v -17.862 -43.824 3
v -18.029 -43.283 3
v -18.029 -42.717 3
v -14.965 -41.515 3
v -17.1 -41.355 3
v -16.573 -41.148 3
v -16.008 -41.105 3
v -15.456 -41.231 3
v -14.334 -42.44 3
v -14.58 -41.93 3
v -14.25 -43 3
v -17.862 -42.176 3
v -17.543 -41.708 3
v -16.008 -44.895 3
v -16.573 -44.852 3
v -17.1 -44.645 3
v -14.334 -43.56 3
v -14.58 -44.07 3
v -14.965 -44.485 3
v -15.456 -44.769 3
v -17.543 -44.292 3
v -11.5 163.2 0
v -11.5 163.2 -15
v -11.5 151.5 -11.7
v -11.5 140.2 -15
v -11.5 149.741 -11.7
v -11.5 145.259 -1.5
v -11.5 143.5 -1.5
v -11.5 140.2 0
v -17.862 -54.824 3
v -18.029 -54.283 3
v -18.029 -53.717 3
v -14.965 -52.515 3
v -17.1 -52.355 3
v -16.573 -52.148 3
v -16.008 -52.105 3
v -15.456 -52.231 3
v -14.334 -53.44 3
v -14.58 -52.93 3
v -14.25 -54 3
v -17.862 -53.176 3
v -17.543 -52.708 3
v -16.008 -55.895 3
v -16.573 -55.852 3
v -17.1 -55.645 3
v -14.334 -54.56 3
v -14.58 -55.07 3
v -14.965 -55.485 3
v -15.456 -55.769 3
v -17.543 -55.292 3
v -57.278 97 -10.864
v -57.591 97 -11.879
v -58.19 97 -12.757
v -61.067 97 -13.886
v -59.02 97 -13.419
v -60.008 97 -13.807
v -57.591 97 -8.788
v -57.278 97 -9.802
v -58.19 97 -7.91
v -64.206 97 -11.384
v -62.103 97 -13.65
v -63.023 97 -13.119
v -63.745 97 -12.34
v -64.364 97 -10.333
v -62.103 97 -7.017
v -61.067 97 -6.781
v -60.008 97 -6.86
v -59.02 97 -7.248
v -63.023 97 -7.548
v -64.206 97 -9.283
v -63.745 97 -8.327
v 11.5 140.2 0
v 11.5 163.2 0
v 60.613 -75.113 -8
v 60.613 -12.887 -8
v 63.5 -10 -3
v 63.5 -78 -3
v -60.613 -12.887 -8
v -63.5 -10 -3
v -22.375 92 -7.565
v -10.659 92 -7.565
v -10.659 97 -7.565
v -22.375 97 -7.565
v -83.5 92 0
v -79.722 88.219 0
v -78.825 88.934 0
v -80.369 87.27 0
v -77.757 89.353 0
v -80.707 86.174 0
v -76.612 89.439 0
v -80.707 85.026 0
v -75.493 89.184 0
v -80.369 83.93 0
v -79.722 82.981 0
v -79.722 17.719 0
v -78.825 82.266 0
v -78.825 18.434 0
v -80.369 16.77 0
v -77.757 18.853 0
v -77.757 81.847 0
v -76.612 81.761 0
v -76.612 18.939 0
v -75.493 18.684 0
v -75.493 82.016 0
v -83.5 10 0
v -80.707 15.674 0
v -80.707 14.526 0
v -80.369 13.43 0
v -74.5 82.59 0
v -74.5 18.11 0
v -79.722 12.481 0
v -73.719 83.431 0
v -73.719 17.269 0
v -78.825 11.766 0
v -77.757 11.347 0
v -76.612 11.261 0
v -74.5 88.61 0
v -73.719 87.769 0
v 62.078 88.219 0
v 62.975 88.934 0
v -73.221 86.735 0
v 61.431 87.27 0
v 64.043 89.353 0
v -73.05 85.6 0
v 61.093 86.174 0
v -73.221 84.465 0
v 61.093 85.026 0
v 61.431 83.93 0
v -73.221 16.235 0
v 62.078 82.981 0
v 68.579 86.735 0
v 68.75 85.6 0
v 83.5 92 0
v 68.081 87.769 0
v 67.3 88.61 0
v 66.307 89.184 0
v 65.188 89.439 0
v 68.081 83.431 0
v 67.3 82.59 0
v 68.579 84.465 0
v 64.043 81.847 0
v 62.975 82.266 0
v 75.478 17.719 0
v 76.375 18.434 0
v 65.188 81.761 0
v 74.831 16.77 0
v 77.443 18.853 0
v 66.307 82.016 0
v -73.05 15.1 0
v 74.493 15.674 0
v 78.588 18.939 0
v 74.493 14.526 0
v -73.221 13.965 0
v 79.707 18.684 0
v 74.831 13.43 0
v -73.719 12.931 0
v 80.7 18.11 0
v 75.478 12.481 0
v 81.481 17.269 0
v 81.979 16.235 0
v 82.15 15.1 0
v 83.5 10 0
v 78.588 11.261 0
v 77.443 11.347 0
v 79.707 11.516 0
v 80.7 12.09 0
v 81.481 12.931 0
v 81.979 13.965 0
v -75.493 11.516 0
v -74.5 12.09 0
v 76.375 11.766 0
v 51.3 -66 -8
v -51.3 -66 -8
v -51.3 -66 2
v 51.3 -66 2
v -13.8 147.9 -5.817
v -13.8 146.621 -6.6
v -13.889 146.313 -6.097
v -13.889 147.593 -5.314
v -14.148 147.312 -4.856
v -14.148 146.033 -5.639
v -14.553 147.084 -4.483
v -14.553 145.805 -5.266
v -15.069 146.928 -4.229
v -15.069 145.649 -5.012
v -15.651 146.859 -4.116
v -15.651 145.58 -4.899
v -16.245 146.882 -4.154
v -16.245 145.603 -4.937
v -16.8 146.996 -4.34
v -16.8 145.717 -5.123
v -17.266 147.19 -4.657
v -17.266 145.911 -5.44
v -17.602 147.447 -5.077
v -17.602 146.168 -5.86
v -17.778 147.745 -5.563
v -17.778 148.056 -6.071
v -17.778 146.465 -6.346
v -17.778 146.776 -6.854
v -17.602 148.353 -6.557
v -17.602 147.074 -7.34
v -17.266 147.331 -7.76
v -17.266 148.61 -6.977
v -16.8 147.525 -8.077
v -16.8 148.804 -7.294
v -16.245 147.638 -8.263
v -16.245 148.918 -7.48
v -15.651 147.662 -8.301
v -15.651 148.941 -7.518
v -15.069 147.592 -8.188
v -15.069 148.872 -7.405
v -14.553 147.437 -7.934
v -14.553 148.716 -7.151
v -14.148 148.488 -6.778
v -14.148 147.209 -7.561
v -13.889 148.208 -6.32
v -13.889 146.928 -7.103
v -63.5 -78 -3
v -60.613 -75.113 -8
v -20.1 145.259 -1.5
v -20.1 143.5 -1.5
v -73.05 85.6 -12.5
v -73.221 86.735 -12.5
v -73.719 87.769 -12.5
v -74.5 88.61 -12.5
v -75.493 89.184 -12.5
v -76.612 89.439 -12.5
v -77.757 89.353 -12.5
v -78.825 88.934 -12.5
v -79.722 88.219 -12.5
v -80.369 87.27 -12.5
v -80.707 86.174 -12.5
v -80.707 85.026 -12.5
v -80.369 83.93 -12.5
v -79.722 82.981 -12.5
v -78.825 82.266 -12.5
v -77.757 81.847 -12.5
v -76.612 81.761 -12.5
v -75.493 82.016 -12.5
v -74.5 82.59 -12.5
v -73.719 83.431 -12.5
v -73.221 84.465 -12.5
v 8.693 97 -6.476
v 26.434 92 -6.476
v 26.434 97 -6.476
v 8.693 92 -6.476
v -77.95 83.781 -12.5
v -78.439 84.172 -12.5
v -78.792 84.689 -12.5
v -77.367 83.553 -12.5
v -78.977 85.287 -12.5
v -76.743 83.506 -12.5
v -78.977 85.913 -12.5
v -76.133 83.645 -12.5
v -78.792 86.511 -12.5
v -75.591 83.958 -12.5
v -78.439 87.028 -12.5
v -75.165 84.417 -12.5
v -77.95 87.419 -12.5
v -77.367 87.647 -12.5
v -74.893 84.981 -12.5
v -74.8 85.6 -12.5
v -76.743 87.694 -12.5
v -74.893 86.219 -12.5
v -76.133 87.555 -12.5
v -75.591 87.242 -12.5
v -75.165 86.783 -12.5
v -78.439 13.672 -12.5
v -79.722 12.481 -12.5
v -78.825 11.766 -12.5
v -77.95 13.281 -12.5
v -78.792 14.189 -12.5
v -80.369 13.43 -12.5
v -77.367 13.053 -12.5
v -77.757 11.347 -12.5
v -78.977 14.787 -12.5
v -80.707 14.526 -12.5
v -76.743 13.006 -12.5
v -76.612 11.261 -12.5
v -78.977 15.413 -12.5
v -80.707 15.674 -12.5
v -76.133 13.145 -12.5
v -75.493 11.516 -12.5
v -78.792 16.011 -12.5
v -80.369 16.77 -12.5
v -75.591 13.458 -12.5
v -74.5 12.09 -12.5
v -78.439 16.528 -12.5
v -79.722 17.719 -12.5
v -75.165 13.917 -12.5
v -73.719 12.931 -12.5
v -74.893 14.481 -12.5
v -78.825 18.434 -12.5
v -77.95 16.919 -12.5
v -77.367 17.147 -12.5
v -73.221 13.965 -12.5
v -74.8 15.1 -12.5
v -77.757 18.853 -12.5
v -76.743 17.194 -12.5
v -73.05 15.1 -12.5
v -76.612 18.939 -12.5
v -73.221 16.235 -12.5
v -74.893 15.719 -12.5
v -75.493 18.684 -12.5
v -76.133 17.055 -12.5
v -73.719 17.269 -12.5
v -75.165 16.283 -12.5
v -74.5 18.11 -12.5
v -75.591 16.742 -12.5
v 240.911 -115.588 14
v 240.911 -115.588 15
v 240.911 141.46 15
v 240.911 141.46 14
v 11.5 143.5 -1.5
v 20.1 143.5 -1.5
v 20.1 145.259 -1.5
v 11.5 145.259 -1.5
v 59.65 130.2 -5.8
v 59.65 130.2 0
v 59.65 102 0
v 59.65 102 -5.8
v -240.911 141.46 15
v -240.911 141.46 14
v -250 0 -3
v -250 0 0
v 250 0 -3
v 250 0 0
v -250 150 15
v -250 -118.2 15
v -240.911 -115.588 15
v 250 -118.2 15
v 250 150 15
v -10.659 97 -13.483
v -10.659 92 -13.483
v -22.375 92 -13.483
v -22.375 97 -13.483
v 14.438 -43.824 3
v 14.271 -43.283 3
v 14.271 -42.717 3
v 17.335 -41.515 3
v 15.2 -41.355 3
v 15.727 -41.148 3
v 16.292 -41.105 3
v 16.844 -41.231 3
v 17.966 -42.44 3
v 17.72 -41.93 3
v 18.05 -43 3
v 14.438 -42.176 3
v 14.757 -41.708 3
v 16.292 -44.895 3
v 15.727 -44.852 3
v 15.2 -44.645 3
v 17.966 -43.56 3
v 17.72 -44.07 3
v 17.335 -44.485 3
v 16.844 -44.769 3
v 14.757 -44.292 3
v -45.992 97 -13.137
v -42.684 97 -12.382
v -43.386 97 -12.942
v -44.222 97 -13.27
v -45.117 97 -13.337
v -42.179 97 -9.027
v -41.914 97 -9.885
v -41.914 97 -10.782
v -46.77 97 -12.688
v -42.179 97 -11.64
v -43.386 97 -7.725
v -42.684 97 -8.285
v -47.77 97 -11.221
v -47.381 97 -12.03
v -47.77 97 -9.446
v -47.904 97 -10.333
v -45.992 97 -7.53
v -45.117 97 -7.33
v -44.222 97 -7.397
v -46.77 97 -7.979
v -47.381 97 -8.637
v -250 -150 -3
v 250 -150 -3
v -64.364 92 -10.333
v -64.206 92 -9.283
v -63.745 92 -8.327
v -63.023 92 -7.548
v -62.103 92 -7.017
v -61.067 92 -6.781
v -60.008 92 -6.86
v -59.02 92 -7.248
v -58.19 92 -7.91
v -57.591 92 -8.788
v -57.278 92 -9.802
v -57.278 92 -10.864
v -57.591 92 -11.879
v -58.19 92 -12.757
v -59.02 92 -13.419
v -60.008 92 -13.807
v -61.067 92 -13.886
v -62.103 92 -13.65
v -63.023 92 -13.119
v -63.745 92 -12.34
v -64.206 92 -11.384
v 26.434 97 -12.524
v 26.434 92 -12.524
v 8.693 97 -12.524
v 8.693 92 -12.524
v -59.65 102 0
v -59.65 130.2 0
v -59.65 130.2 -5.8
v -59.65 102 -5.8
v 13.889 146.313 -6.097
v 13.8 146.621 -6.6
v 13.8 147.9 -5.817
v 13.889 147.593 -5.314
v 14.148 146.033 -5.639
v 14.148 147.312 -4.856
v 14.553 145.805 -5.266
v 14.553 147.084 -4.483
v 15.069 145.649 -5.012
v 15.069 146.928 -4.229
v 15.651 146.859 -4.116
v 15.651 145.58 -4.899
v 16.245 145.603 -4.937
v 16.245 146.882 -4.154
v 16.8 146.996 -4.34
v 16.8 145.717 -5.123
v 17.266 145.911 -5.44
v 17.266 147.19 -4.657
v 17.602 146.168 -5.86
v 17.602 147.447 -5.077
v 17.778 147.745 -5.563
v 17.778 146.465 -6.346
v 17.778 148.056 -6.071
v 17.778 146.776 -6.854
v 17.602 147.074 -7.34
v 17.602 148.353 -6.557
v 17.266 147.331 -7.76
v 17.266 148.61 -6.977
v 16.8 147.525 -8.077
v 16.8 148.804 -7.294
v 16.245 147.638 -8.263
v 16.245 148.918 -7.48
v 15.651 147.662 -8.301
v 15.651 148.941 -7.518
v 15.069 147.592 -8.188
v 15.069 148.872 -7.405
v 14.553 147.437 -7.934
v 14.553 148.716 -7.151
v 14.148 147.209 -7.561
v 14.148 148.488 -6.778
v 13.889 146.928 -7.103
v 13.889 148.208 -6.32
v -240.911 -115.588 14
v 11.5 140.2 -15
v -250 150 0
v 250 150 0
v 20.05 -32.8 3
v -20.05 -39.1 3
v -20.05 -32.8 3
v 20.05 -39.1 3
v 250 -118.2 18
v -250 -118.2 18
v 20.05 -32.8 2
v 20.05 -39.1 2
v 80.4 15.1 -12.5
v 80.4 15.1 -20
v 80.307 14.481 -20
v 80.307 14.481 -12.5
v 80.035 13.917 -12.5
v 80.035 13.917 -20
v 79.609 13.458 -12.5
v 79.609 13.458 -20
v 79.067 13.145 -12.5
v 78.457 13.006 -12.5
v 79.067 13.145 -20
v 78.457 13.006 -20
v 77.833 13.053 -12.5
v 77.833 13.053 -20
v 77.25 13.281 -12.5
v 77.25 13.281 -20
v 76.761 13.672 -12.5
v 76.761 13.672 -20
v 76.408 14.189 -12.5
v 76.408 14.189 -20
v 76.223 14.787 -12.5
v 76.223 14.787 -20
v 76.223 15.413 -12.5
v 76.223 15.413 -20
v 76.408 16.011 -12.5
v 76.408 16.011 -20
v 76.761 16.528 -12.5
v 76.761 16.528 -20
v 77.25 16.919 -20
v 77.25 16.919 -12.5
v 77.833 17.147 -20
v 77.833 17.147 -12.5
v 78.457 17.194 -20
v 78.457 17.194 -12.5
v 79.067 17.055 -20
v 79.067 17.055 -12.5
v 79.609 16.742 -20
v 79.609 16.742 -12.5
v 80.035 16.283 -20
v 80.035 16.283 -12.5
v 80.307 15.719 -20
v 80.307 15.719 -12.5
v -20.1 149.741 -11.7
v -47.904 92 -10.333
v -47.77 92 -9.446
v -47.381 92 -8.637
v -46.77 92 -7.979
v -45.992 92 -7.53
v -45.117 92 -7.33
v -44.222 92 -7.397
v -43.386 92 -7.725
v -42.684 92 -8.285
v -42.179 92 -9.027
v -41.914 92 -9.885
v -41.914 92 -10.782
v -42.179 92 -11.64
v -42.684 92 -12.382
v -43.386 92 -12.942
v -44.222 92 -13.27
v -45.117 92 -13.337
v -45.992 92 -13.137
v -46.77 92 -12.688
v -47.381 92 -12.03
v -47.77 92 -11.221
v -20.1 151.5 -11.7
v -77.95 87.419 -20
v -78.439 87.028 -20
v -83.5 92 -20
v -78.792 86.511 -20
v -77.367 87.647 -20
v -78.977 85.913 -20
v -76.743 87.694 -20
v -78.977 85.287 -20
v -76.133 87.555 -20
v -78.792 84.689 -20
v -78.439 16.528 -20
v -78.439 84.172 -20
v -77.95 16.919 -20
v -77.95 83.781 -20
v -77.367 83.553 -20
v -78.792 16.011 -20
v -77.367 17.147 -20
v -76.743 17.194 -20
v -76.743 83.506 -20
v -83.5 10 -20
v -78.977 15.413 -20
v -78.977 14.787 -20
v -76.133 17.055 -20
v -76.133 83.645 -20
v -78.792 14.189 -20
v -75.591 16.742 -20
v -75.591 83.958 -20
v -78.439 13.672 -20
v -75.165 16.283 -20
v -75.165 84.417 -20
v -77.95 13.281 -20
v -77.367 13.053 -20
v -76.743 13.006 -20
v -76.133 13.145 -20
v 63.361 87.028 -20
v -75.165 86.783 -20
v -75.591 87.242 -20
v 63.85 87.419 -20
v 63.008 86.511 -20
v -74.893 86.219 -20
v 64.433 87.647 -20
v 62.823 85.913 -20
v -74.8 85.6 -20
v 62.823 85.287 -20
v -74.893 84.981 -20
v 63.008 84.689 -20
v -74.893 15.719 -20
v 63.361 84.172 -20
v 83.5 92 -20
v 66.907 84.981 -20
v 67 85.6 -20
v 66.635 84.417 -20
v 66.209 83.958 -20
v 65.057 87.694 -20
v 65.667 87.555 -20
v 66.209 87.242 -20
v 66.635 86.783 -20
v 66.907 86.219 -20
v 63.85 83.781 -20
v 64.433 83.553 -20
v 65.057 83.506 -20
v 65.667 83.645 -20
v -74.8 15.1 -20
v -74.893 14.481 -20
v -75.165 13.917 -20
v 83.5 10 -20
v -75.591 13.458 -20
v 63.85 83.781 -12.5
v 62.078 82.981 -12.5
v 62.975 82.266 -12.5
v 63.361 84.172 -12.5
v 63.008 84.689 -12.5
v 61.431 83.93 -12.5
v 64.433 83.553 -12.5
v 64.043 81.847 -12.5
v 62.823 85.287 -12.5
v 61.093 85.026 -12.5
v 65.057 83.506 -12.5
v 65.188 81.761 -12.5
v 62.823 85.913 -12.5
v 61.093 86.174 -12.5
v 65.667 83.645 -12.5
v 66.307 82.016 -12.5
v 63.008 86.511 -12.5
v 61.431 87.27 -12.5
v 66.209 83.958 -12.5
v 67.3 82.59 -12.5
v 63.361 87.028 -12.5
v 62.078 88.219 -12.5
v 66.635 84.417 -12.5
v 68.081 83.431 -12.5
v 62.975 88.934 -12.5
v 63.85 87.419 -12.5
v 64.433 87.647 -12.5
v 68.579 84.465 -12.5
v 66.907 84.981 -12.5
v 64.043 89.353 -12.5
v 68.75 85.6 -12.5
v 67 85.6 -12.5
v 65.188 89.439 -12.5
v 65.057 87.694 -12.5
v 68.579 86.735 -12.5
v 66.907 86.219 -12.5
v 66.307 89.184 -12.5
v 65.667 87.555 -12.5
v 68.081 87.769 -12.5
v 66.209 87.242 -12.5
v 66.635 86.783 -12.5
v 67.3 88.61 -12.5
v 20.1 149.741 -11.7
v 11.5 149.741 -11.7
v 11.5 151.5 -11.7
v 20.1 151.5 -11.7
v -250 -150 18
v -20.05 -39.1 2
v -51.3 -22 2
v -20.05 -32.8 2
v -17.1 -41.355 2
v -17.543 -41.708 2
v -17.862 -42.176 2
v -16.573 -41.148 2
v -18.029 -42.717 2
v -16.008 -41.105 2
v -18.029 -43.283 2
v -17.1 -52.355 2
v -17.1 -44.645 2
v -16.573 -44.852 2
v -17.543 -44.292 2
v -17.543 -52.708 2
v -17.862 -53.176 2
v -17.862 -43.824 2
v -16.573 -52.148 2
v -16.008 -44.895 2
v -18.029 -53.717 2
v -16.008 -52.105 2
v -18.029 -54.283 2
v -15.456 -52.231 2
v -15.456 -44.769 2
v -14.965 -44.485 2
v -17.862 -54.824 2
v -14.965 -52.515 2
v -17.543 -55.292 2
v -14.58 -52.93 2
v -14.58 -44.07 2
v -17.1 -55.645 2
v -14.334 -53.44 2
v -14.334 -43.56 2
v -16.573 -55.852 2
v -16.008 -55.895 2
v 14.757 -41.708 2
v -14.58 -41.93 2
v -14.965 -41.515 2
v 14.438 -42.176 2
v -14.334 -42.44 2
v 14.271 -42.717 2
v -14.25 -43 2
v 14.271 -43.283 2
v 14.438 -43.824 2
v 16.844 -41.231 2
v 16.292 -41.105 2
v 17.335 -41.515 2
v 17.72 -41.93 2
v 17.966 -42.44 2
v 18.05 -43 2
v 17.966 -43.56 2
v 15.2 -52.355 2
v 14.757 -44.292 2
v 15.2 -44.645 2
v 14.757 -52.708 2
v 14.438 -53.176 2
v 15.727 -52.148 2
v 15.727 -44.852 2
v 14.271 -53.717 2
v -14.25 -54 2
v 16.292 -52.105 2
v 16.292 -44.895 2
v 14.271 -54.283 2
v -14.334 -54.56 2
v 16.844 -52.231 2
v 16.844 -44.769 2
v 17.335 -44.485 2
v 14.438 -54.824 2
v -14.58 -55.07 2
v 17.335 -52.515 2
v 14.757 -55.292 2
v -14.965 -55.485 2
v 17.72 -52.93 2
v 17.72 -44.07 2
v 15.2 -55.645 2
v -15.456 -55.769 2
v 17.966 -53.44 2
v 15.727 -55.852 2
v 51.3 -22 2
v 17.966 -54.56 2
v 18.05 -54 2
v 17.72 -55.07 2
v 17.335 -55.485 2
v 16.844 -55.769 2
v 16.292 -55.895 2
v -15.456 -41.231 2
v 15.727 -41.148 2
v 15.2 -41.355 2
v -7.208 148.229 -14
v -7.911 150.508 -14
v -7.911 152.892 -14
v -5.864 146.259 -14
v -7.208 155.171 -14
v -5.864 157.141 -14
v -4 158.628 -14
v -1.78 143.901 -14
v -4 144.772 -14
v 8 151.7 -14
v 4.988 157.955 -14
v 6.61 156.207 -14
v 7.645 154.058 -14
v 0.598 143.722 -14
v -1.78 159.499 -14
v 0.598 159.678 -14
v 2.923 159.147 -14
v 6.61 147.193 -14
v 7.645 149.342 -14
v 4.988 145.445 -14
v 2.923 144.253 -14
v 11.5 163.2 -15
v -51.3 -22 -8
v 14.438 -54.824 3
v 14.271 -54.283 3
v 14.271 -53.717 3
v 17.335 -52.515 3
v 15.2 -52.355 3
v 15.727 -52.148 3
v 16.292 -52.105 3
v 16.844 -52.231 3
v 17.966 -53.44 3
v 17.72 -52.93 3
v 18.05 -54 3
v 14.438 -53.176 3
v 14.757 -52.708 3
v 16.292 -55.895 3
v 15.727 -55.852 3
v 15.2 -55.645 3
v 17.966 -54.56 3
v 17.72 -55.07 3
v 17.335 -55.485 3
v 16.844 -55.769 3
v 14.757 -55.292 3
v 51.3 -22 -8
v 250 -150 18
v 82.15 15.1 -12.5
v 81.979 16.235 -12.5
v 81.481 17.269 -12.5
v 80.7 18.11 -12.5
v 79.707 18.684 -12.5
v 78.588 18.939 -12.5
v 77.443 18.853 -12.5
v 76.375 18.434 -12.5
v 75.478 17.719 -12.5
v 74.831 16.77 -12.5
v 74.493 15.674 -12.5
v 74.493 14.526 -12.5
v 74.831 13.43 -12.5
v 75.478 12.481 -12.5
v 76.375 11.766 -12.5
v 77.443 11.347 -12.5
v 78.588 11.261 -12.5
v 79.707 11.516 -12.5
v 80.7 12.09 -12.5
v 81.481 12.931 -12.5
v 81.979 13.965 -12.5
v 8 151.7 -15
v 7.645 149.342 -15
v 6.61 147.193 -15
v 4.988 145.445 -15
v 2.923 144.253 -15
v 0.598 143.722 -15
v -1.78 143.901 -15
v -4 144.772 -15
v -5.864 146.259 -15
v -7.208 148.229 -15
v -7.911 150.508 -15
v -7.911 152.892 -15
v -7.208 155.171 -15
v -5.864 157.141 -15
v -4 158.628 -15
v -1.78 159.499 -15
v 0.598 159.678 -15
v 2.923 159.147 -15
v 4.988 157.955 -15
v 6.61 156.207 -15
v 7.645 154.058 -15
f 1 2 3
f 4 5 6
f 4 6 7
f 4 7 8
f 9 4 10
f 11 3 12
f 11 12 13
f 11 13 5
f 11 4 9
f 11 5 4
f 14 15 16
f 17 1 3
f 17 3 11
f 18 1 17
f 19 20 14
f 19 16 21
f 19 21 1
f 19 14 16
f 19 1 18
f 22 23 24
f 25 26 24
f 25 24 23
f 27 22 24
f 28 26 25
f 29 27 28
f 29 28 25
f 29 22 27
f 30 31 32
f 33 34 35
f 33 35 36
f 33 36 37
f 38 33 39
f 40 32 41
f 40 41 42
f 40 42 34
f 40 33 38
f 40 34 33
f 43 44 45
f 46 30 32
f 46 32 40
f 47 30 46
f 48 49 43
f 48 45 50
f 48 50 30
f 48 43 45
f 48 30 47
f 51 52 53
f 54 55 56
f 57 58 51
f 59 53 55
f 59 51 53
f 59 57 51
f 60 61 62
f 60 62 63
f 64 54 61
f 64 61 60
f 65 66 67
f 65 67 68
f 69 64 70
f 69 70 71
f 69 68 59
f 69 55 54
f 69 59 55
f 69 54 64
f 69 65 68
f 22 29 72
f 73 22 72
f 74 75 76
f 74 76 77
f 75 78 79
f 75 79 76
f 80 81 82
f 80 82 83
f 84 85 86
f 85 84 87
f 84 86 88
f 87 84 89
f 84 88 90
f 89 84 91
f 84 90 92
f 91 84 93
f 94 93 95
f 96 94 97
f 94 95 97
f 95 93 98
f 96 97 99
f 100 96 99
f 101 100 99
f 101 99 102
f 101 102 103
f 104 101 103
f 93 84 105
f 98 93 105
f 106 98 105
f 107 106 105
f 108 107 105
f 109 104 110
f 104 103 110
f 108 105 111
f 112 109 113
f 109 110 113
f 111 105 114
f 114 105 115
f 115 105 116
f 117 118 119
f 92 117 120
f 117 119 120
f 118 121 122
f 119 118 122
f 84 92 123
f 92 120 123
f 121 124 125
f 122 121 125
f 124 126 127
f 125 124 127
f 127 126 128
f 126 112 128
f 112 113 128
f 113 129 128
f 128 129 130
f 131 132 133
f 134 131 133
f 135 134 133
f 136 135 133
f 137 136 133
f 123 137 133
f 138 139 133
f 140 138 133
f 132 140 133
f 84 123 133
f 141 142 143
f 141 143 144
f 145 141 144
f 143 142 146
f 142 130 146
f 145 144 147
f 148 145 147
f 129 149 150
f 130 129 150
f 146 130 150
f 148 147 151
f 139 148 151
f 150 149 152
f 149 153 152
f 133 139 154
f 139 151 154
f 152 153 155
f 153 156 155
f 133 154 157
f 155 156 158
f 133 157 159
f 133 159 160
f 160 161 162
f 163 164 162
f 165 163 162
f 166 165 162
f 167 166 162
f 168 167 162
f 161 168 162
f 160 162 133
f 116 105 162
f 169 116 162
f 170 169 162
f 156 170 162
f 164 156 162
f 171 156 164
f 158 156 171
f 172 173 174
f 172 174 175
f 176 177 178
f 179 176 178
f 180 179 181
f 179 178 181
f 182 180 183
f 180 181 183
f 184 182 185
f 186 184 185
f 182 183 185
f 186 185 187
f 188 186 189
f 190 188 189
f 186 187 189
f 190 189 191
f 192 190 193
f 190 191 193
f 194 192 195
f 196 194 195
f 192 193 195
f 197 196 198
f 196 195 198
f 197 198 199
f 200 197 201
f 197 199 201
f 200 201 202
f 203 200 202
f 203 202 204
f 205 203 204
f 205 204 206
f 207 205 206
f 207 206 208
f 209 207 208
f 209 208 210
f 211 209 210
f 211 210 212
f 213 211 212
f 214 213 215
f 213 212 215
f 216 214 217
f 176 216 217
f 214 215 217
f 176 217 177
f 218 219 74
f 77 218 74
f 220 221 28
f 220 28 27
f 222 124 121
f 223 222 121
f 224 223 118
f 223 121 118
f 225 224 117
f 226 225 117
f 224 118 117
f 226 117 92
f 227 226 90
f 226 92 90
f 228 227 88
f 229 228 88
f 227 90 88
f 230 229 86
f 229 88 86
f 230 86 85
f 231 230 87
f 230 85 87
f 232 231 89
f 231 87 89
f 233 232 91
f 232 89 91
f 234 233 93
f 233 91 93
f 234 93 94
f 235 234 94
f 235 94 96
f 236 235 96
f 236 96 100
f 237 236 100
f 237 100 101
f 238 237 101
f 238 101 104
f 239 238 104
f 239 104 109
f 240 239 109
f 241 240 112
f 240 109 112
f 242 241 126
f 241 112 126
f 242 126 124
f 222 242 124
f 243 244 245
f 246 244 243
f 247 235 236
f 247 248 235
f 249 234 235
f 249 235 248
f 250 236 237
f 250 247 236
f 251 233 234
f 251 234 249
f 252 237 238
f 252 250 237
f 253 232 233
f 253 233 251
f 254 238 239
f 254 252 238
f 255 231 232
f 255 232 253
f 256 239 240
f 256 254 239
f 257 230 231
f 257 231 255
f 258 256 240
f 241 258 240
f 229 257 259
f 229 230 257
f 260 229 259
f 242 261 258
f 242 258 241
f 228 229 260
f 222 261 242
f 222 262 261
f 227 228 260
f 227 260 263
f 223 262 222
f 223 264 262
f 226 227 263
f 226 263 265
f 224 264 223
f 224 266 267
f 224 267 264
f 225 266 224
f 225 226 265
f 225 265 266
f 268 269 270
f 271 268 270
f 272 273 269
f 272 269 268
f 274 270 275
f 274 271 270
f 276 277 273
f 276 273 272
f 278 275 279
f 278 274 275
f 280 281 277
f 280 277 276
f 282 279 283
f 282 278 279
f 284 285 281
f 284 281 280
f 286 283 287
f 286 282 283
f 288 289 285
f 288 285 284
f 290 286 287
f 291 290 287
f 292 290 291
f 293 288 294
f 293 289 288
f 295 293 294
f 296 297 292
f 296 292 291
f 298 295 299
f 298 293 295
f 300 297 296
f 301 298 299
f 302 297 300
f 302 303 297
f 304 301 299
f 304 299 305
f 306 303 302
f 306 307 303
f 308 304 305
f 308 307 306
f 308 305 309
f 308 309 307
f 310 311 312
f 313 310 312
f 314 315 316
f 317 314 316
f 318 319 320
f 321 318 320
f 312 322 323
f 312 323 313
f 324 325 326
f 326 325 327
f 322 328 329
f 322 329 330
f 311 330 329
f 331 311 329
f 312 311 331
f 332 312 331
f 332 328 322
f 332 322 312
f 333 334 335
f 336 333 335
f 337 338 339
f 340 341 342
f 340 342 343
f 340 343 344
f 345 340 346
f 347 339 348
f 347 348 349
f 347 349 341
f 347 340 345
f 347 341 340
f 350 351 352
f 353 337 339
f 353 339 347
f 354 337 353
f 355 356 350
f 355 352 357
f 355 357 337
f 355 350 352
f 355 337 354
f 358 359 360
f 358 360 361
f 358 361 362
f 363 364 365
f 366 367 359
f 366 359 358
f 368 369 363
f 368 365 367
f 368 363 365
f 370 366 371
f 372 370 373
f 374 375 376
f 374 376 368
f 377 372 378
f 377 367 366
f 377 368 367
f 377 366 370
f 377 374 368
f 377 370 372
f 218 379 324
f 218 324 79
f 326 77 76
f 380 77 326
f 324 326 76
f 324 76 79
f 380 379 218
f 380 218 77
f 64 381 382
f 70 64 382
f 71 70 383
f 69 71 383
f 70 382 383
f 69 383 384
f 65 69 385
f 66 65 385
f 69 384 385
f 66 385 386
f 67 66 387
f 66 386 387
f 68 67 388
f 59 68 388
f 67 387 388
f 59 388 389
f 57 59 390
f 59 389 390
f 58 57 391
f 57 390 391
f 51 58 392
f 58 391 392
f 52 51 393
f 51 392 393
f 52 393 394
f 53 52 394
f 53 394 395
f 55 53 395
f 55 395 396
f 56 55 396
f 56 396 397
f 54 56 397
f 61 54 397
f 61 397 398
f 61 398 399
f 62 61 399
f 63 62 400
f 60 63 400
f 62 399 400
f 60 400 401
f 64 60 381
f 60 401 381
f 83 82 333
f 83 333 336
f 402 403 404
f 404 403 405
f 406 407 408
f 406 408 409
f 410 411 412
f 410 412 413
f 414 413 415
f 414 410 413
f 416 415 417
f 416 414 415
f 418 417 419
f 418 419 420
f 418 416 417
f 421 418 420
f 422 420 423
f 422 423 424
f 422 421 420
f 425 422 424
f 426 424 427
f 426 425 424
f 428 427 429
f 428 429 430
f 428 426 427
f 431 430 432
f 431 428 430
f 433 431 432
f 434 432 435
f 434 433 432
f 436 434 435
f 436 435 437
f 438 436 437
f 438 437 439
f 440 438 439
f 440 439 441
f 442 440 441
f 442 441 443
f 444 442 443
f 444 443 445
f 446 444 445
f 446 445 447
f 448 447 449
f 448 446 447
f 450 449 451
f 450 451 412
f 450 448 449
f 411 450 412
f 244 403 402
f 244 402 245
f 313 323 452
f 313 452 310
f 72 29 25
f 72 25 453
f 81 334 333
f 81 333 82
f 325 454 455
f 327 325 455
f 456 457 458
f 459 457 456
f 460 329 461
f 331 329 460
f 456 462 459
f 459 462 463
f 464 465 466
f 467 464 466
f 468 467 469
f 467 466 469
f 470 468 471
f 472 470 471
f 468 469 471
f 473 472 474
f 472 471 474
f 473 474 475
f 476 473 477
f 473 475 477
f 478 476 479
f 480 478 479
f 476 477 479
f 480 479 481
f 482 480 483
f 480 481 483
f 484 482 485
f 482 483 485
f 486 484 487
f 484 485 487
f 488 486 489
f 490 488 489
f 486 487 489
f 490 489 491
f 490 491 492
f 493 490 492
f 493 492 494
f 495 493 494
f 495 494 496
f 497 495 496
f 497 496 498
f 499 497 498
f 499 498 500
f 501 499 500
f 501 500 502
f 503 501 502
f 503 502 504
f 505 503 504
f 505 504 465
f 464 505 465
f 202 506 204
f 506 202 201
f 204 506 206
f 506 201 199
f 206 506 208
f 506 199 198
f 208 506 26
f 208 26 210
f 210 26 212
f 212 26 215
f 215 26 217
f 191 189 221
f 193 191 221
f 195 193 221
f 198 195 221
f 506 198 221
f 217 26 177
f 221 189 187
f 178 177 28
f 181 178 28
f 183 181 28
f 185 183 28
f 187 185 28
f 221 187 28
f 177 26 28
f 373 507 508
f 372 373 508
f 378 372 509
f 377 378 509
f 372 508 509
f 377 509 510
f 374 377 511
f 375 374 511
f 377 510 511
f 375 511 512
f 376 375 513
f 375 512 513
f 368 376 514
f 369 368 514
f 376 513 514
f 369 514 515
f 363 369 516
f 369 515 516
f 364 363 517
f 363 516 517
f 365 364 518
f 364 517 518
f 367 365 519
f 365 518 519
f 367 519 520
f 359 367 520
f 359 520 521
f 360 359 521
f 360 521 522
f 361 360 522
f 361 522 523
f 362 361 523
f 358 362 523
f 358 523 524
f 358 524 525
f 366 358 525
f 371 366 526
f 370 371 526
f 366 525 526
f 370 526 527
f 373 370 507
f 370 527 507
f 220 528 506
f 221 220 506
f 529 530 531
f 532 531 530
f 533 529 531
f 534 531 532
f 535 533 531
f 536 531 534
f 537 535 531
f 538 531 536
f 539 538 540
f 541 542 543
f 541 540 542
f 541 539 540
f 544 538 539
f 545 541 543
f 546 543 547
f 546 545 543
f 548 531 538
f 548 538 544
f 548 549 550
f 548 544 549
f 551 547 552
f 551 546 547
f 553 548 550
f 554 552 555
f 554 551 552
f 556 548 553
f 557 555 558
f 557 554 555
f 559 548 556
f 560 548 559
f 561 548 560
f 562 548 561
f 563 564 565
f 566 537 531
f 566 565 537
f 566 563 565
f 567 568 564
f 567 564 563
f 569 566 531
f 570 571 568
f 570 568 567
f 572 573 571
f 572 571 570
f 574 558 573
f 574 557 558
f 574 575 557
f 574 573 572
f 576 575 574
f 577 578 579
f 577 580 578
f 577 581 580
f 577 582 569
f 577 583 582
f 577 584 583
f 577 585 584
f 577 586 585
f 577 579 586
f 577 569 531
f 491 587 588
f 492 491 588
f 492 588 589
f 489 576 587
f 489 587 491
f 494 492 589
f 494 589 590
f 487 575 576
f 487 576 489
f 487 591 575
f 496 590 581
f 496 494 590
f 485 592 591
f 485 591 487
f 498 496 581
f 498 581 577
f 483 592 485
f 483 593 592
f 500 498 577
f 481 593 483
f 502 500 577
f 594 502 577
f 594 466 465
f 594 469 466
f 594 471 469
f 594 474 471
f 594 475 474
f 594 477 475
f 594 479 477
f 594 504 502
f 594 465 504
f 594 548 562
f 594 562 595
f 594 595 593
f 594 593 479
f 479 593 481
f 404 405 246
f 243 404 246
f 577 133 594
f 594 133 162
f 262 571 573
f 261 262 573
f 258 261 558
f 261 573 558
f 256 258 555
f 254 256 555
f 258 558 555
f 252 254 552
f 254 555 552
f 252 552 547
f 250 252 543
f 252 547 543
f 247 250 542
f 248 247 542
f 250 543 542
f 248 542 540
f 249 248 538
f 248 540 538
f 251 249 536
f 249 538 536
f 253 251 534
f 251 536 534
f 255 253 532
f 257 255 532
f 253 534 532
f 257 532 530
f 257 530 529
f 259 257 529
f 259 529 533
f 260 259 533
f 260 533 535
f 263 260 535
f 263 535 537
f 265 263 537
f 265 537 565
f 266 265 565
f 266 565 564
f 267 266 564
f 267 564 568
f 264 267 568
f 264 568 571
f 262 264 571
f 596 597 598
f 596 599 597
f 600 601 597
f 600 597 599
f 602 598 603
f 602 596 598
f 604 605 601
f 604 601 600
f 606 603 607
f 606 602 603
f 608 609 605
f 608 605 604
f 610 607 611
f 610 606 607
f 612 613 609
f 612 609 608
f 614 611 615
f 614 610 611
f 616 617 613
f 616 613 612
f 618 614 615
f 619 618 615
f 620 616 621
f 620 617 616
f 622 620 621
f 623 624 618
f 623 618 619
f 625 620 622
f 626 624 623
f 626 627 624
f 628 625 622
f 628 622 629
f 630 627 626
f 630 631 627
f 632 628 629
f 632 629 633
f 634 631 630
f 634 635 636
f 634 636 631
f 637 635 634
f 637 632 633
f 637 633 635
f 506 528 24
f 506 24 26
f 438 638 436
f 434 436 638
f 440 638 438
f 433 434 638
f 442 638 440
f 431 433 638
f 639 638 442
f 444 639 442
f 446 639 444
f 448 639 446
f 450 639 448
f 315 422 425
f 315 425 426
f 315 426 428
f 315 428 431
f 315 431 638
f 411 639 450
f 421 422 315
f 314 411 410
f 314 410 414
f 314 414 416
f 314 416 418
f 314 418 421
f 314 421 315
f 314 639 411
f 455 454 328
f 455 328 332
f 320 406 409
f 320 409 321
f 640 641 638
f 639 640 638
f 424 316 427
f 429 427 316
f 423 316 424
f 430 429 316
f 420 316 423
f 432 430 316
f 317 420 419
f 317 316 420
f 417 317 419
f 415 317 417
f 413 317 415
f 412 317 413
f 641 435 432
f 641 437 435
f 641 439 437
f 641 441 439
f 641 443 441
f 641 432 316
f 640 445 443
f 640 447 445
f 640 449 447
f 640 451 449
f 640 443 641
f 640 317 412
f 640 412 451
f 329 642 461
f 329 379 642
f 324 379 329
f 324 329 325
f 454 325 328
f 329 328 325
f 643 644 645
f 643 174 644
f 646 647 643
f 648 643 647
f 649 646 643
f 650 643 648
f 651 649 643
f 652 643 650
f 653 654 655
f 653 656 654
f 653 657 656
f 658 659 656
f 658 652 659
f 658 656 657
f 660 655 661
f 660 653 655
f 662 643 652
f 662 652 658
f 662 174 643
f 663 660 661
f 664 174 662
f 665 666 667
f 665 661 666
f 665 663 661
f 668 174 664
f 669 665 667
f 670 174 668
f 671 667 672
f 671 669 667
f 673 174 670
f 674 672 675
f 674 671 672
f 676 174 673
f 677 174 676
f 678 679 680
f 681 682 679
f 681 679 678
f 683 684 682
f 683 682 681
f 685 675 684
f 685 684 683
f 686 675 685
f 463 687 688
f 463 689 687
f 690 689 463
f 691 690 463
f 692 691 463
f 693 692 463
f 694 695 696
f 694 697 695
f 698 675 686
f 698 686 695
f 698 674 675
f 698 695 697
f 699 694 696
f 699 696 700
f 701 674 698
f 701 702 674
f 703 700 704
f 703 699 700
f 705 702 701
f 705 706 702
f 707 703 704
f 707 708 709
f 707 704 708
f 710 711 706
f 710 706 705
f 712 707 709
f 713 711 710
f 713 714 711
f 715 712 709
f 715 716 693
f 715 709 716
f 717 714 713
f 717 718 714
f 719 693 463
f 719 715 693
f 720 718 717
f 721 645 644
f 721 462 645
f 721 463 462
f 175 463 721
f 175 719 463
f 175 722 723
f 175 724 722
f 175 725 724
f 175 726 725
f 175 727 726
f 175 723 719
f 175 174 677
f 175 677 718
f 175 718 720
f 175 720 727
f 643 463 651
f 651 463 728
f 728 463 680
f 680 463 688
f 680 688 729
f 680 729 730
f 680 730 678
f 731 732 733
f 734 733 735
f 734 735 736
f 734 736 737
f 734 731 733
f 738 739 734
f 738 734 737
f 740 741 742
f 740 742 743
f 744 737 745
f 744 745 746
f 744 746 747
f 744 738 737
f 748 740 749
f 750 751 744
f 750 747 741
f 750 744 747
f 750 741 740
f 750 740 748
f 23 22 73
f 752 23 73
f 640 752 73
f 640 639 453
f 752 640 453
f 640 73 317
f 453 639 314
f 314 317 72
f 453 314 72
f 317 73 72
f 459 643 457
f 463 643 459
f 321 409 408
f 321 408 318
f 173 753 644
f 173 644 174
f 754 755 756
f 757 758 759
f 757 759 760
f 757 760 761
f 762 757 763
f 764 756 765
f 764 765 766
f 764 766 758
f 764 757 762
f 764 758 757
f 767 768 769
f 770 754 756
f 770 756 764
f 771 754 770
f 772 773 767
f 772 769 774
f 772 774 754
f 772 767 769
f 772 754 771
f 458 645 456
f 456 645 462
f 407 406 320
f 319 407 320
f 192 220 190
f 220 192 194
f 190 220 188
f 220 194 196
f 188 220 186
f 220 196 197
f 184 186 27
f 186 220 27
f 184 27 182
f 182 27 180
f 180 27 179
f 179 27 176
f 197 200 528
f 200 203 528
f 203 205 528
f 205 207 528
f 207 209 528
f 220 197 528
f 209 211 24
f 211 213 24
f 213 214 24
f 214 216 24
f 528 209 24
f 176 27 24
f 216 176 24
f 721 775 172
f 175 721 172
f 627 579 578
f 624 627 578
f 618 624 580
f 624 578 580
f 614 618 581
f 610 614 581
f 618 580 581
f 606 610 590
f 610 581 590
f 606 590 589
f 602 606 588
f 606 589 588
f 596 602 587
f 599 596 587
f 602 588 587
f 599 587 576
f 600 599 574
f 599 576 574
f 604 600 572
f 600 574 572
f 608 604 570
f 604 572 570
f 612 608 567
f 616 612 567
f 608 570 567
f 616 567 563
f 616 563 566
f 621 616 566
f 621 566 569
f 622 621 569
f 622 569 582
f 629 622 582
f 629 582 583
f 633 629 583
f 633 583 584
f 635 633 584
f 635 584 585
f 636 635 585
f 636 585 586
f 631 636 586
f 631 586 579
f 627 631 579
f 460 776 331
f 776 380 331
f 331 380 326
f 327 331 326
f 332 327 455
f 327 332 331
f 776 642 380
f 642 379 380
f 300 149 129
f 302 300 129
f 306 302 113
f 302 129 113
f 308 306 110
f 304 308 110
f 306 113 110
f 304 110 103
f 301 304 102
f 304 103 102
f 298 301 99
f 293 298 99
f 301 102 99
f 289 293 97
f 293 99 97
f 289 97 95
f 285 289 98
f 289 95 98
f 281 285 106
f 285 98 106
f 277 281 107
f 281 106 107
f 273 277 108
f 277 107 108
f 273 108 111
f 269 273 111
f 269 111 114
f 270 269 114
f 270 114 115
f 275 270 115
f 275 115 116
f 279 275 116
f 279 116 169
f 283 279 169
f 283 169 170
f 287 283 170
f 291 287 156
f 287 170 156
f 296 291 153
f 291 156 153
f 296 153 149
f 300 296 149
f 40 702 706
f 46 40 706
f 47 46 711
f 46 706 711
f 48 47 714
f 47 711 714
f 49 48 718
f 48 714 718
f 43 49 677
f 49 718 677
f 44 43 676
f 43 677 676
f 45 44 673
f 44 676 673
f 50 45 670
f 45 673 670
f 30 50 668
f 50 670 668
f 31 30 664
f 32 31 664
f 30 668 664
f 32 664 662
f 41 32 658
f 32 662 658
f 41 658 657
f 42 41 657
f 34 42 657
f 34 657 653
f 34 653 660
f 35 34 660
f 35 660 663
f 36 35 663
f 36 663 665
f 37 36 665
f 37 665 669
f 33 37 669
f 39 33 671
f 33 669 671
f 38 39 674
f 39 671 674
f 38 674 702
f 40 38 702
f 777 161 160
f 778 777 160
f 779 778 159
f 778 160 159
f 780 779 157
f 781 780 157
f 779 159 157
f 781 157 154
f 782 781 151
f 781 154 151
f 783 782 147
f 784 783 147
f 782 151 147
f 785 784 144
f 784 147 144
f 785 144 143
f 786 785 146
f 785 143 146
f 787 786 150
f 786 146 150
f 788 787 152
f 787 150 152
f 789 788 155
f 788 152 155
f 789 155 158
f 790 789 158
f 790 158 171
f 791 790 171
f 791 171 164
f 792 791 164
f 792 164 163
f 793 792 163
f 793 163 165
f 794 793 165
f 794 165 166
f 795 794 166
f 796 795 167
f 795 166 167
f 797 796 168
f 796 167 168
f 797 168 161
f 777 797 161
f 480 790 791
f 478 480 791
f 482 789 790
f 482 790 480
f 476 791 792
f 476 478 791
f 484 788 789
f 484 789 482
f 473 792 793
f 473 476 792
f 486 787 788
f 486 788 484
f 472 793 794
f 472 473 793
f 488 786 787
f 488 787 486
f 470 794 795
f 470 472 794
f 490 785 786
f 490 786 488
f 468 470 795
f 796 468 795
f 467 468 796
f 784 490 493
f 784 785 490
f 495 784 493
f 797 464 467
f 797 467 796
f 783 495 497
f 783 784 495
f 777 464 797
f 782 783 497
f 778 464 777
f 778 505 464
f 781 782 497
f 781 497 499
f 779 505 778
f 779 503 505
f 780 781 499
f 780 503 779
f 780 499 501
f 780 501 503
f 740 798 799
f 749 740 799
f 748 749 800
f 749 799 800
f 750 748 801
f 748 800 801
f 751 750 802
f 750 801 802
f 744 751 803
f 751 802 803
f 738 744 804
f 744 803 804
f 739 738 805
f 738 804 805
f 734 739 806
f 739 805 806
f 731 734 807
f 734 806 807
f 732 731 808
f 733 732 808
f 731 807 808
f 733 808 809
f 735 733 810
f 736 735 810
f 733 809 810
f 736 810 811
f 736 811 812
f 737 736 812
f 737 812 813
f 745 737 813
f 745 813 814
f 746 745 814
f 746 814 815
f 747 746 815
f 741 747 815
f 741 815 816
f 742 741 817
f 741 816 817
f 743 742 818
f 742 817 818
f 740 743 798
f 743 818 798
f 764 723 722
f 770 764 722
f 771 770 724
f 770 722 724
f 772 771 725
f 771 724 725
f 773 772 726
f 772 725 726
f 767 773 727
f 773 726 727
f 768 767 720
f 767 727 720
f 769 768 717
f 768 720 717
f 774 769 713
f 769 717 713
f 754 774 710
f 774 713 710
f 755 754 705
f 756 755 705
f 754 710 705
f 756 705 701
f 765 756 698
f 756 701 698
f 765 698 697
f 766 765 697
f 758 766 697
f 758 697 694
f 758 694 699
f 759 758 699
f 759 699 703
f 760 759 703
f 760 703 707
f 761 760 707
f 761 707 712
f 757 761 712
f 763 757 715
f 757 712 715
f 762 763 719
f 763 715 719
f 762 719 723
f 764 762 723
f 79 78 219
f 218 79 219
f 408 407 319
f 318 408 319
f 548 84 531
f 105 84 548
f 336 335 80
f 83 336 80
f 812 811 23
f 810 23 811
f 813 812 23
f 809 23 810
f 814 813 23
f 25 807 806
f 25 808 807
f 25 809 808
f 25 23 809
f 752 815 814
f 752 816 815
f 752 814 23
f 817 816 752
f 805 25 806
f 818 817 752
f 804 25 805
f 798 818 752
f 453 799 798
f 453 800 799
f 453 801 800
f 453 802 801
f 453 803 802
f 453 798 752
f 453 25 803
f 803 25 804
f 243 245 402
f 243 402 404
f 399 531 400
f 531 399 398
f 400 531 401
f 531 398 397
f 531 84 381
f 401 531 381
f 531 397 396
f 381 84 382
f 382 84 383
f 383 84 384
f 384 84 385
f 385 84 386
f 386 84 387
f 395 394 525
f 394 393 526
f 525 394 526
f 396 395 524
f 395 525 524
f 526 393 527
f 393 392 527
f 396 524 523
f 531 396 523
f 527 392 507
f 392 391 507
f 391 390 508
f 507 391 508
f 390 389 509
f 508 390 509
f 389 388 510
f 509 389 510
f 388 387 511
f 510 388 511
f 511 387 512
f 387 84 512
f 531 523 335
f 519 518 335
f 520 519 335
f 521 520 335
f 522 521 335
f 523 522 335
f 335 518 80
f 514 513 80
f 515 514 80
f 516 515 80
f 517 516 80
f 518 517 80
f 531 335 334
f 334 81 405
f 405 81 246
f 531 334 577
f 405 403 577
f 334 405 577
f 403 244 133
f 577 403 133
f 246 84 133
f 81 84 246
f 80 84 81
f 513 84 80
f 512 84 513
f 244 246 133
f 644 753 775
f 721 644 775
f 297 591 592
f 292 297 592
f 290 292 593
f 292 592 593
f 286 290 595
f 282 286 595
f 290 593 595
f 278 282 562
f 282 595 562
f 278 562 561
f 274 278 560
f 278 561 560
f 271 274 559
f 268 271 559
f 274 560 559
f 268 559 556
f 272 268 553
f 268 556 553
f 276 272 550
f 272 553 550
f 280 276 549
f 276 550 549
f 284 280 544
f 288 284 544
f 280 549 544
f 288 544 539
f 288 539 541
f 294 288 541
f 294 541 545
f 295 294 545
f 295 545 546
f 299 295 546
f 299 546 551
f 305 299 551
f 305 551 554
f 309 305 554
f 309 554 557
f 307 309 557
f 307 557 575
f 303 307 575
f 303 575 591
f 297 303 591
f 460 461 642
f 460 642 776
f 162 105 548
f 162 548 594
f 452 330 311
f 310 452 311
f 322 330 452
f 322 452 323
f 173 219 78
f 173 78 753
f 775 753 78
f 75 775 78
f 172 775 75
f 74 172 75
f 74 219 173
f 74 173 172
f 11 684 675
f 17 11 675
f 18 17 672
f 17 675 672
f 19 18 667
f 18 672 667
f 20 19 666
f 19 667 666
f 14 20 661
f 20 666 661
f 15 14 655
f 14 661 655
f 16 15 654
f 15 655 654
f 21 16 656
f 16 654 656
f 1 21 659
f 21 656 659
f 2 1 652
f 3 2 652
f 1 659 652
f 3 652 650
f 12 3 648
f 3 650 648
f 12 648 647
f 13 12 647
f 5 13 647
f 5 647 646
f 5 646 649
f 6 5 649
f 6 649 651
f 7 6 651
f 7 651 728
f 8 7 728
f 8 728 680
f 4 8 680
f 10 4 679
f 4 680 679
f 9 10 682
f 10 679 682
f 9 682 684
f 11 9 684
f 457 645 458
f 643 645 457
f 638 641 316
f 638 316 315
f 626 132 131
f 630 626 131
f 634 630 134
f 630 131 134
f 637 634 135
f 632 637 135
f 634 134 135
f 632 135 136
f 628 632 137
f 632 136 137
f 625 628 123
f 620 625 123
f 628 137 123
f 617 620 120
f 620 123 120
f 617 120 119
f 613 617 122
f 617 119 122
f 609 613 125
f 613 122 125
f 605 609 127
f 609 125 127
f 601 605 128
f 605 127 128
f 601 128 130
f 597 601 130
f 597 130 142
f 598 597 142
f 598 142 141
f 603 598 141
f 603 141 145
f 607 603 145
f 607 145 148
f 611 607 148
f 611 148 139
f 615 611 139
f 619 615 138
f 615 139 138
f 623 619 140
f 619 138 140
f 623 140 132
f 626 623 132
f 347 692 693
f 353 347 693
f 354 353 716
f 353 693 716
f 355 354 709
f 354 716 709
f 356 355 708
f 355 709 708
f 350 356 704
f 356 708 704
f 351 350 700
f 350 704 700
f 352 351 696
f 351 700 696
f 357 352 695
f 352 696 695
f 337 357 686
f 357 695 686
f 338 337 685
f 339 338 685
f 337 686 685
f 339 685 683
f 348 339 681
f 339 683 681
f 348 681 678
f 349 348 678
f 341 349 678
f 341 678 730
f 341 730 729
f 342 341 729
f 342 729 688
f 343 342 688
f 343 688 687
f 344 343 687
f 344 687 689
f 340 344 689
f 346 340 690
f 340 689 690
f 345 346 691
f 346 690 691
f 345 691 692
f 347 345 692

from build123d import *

# Parameters (mm, degrees)
F0_W      = 500
F0_H      = 300
F1_DEPTH  = 15
F2_W      = 481.8210515528
F2_H      = 257.048019406
F3_DEPTH  = 1
F4_W      = 500
F4_H      = 150
F5_DEPTH  = 3
F6_W      = 127
F6_H      = 68
F7_DEPTH  = 5
F8_SIZE2  = 2.886741
F8_SIZE   = 4.99999
F9_W      = 102.6
F9_H      = 44
F10_DEPTH = 10
F11_W     = 167
F11_H     = 82
F12_DEPTH = 20
F13_R     = 2.1
F14_DEPTH = 20
F15_R     = 3.85
F16_DEPTH = 12.5
F17_W     = 17.7404675633
F17_H     = 6.0484888963
F17_W_2   = 11.7162363604
F17_H_2   = 5.917977076
F17_R     = 3.0117076701
F17_R_2   = 3.5627139526
F18_DEPTH = 5
F19_W     = 500
F19_H     = 31.8
F20_DEPTH = 3
F21_R     = 1.9
F21_W     = 40.1
F21_H     = 6.3
F22_DEPTH = 1
F23_W     = 119.3
F23_H     = 28.2
F24_DEPTH = 5.8
F25_W     = 23
F25_H     = 23
F26_DEPTH = 15
F28_DEPTH = 8.6
F29_R     = 2
F30_DEPTH = 1.5
F31_R     = 8
F32_DEPTH = 1


# Not quite as in the source:
# - a fillet or chamfer is up to 0.001 mm smaller than in the source, because OpenCascade refuses the exact size
# - a pattern or mirror of a feature is missing from the dataset's text; its kind, count and spacing are read off the source's solid


with BuildPart() as f1:
    # F0 (on Top) → F1 (new body)
    with BuildSketch(Plane.XY):
        Rectangle(F0_W, F0_H)
    extrude(amount=F1_DEPTH)

    # F2 (on face) → F3 (cut)
    with BuildSketch(Plane.XY.offset(15)):
        with Locations((0, 12.9358926788)):
            Rectangle(F2_W, F2_H)
    extrude(amount=-F3_DEPTH, mode=Mode.SUBTRACT)

    # F4 (on face) → F5 (join)
    with BuildSketch(Plane(origin=(0, 0, 0), x_dir=(1, 0, 0), z_dir=(0, 0, -1))):
        with Locations((0, 75)):
            Rectangle(F4_W, F4_H)
    extrude(amount=F5_DEPTH)

    # F6 (on face) → F7 (join)
    with BuildSketch(Plane(origin=(0, 0, -3), x_dir=(1, 0, 0), z_dir=(0, 0, -1))):
        with Locations((0, 44)):
            Rectangle(F6_W, F6_H)
    extrude(amount=F7_DEPTH)

    # F8 (size 5 and 2.8867513459 in the source; OpenCascade refuses exactly that, so slightly less here)
    f8_edges = [f1.edges().sort_by_distance(p)[0] for p in [
        (0, -78, -8),
        (-63.5, -44, -8),
        (0, -10, -8),
        (63.5, -44, -8),
    ]]
    chamfer(f8_edges, length=F8_SIZE, length2=F8_SIZE2)

    # F9 (on face) → F10 (cut)
    with BuildSketch(Plane(origin=(0, 0, -8), x_dir=(1, 0, 0), z_dir=(0, 0, -1))):
        with Locations((0, 44)):
            Rectangle(F9_W, F9_H)
    extrude(amount=-F10_DEPTH, mode=Mode.SUBTRACT)

    # F19 (on face) → F20 (join)
    with BuildSketch(Plane.XY.offset(15)):
        with Locations((0, -134.1)):
            Rectangle(F19_W, F19_H)
    extrude(amount=F20_DEPTH)

    # F21 (on face) → F22 (cut)
    with BuildSketch(Plane(origin=(0, 0, 2), x_dir=(1, 0, 0), z_dir=(0, 0, -1))):
        with Locations((-16.15, 43)):
            Circle(F21_R)
        with Locations((-16.15, 54)):
            Circle(F21_R)
        with Locations((16.15, 54)):
            Circle(F21_R)
        with Locations((16.15, 43)):
            Circle(F21_R)
        with Locations((0, 35.95)):
            Rectangle(F21_W, F21_H)
    extrude(amount=-F22_DEPTH, mode=Mode.SUBTRACT)


with BuildPart() as f12:
    # F11 (on face) → F12 (new body)
    with BuildSketch(Plane(origin=(0, 0, 0), x_dir=(1, 0, 0), z_dir=(0, 0, -1))):
        with Locations((0, -51)):
            Rectangle(F11_W, F11_H)
    extrude(amount=F12_DEPTH)

    # F13 (on face) → F14 (cut, through all)
    with BuildSketch(Plane(origin=(0, 0, -20), x_dir=(1, 0, 0), z_dir=(0, 0, -1))):
        with Locations((64.9, -85.6)):
            Circle(F13_R)
        with Locations((78.3, -15.1)):
            Circle(F13_R)
        with Locations((-76.9, -85.6)):
            Circle(F13_R)
        with Locations((-76.9, -15.1)):
            Circle(F13_R)
    extrude(amount=-F14_DEPTH, mode=Mode.SUBTRACT)

    # F15 (on face) → F16 (cut)
    with BuildSketch(Plane.XY):
        with Locations((-76.9, 15.1)):
            Circle(F15_R)
        with Locations((-76.9, 85.6)):
            Circle(F15_R)
        with Locations((64.9, 85.6)):
            Circle(F15_R)
        with Locations((78.3, 15.1)):
            Circle(F15_R)
    extrude(amount=-F16_DEPTH, mode=Mode.SUBTRACT)

    # F17 (on face) → F18 (join)
    with BuildSketch(Plane(origin=(0, 92, 0), x_dir=(-1, 0, 0), z_dir=(0, 1, 0))):
        with Locations((-17.5635432824, -9.4999487046)):
            Rectangle(F17_W, F17_H)
        with Locations((16.5168526582, -10.5239257682)):
            Rectangle(F17_W_2, F17_H_2)
        with Locations((44.8921956122, -10.3334598243)):
            Circle(F17_R)
        with Locations((60.8012191951, -10.3334598243)):
            Circle(F17_R_2)
    extrude(amount=F18_DEPTH)


with BuildPart() as f24:
    # F23 (on face) → F24 (new body)
    with BuildSketch(Plane(origin=(0, 0, 0), x_dir=(1, 0, 0), z_dir=(0, 0, -1))):
        with Locations((0, -116.1)):
            Rectangle(F23_W, F23_H)
    extrude(amount=F24_DEPTH)


with BuildPart() as f26:
    # F25 (on face) → F26 (new body)
    with BuildSketch(Plane(origin=(0, 0, 0), x_dir=(1, 0, 0), z_dir=(0, 0, -1))):
        with Locations((0, -151.7)):
            Rectangle(F25_W, F25_H)
    extrude(amount=F26_DEPTH)

    # F27 (on face) → F28 (join)
    with BuildSketch(Plane(origin=(-11.5, 0, 0), x_dir=(0, -1, 0), z_dir=(-1, 0, 0))):
        Polygon((-149.7414580757, -11.7), (-143.5, -1.5), (-145.2585419243, -1.5), (-151.5, -11.7), align=None)
    f28 = extrude(amount=F28_DEPTH)

    # F28_copies: F28 across plane
    add(f28.mirror(Plane(origin=(0, 0, 0), x_dir=(0, 0, 1), z_dir=(1, 0, 0))))

    # F29 (on face) → F30 (cut, through all)
    with BuildSketch(Plane(origin=(0, 103.7390315274, 63.4787074597), x_dir=(1, 0, 0), z_dir=(0, -0.8529793798, -0.5219446116))):
        with Locations((-15.8, -82.1575633804)):
            Circle(F29_R)
    f30 = extrude(amount=-F30_DEPTH, mode=Mode.SUBTRACT)

    # F30_copies: F30 across plane
    add(f30.mirror(Plane(origin=(0, 0, 0), x_dir=(0, 0, 1), z_dir=(1, 0, 0))), mode=Mode.SUBTRACT)

    # F31 (on face) → F32 (cut)
    with BuildSketch(Plane(origin=(0, 0, -15), x_dir=(1, 0, 0), z_dir=(0, 0, -1))):
        with Locations((0, -151.7)):
            Circle(F31_R)
    extrude(amount=-F32_DEPTH, mode=Mode.SUBTRACT)


solid = Compound([f1.part, f12.part, f24.part, f26.part])
